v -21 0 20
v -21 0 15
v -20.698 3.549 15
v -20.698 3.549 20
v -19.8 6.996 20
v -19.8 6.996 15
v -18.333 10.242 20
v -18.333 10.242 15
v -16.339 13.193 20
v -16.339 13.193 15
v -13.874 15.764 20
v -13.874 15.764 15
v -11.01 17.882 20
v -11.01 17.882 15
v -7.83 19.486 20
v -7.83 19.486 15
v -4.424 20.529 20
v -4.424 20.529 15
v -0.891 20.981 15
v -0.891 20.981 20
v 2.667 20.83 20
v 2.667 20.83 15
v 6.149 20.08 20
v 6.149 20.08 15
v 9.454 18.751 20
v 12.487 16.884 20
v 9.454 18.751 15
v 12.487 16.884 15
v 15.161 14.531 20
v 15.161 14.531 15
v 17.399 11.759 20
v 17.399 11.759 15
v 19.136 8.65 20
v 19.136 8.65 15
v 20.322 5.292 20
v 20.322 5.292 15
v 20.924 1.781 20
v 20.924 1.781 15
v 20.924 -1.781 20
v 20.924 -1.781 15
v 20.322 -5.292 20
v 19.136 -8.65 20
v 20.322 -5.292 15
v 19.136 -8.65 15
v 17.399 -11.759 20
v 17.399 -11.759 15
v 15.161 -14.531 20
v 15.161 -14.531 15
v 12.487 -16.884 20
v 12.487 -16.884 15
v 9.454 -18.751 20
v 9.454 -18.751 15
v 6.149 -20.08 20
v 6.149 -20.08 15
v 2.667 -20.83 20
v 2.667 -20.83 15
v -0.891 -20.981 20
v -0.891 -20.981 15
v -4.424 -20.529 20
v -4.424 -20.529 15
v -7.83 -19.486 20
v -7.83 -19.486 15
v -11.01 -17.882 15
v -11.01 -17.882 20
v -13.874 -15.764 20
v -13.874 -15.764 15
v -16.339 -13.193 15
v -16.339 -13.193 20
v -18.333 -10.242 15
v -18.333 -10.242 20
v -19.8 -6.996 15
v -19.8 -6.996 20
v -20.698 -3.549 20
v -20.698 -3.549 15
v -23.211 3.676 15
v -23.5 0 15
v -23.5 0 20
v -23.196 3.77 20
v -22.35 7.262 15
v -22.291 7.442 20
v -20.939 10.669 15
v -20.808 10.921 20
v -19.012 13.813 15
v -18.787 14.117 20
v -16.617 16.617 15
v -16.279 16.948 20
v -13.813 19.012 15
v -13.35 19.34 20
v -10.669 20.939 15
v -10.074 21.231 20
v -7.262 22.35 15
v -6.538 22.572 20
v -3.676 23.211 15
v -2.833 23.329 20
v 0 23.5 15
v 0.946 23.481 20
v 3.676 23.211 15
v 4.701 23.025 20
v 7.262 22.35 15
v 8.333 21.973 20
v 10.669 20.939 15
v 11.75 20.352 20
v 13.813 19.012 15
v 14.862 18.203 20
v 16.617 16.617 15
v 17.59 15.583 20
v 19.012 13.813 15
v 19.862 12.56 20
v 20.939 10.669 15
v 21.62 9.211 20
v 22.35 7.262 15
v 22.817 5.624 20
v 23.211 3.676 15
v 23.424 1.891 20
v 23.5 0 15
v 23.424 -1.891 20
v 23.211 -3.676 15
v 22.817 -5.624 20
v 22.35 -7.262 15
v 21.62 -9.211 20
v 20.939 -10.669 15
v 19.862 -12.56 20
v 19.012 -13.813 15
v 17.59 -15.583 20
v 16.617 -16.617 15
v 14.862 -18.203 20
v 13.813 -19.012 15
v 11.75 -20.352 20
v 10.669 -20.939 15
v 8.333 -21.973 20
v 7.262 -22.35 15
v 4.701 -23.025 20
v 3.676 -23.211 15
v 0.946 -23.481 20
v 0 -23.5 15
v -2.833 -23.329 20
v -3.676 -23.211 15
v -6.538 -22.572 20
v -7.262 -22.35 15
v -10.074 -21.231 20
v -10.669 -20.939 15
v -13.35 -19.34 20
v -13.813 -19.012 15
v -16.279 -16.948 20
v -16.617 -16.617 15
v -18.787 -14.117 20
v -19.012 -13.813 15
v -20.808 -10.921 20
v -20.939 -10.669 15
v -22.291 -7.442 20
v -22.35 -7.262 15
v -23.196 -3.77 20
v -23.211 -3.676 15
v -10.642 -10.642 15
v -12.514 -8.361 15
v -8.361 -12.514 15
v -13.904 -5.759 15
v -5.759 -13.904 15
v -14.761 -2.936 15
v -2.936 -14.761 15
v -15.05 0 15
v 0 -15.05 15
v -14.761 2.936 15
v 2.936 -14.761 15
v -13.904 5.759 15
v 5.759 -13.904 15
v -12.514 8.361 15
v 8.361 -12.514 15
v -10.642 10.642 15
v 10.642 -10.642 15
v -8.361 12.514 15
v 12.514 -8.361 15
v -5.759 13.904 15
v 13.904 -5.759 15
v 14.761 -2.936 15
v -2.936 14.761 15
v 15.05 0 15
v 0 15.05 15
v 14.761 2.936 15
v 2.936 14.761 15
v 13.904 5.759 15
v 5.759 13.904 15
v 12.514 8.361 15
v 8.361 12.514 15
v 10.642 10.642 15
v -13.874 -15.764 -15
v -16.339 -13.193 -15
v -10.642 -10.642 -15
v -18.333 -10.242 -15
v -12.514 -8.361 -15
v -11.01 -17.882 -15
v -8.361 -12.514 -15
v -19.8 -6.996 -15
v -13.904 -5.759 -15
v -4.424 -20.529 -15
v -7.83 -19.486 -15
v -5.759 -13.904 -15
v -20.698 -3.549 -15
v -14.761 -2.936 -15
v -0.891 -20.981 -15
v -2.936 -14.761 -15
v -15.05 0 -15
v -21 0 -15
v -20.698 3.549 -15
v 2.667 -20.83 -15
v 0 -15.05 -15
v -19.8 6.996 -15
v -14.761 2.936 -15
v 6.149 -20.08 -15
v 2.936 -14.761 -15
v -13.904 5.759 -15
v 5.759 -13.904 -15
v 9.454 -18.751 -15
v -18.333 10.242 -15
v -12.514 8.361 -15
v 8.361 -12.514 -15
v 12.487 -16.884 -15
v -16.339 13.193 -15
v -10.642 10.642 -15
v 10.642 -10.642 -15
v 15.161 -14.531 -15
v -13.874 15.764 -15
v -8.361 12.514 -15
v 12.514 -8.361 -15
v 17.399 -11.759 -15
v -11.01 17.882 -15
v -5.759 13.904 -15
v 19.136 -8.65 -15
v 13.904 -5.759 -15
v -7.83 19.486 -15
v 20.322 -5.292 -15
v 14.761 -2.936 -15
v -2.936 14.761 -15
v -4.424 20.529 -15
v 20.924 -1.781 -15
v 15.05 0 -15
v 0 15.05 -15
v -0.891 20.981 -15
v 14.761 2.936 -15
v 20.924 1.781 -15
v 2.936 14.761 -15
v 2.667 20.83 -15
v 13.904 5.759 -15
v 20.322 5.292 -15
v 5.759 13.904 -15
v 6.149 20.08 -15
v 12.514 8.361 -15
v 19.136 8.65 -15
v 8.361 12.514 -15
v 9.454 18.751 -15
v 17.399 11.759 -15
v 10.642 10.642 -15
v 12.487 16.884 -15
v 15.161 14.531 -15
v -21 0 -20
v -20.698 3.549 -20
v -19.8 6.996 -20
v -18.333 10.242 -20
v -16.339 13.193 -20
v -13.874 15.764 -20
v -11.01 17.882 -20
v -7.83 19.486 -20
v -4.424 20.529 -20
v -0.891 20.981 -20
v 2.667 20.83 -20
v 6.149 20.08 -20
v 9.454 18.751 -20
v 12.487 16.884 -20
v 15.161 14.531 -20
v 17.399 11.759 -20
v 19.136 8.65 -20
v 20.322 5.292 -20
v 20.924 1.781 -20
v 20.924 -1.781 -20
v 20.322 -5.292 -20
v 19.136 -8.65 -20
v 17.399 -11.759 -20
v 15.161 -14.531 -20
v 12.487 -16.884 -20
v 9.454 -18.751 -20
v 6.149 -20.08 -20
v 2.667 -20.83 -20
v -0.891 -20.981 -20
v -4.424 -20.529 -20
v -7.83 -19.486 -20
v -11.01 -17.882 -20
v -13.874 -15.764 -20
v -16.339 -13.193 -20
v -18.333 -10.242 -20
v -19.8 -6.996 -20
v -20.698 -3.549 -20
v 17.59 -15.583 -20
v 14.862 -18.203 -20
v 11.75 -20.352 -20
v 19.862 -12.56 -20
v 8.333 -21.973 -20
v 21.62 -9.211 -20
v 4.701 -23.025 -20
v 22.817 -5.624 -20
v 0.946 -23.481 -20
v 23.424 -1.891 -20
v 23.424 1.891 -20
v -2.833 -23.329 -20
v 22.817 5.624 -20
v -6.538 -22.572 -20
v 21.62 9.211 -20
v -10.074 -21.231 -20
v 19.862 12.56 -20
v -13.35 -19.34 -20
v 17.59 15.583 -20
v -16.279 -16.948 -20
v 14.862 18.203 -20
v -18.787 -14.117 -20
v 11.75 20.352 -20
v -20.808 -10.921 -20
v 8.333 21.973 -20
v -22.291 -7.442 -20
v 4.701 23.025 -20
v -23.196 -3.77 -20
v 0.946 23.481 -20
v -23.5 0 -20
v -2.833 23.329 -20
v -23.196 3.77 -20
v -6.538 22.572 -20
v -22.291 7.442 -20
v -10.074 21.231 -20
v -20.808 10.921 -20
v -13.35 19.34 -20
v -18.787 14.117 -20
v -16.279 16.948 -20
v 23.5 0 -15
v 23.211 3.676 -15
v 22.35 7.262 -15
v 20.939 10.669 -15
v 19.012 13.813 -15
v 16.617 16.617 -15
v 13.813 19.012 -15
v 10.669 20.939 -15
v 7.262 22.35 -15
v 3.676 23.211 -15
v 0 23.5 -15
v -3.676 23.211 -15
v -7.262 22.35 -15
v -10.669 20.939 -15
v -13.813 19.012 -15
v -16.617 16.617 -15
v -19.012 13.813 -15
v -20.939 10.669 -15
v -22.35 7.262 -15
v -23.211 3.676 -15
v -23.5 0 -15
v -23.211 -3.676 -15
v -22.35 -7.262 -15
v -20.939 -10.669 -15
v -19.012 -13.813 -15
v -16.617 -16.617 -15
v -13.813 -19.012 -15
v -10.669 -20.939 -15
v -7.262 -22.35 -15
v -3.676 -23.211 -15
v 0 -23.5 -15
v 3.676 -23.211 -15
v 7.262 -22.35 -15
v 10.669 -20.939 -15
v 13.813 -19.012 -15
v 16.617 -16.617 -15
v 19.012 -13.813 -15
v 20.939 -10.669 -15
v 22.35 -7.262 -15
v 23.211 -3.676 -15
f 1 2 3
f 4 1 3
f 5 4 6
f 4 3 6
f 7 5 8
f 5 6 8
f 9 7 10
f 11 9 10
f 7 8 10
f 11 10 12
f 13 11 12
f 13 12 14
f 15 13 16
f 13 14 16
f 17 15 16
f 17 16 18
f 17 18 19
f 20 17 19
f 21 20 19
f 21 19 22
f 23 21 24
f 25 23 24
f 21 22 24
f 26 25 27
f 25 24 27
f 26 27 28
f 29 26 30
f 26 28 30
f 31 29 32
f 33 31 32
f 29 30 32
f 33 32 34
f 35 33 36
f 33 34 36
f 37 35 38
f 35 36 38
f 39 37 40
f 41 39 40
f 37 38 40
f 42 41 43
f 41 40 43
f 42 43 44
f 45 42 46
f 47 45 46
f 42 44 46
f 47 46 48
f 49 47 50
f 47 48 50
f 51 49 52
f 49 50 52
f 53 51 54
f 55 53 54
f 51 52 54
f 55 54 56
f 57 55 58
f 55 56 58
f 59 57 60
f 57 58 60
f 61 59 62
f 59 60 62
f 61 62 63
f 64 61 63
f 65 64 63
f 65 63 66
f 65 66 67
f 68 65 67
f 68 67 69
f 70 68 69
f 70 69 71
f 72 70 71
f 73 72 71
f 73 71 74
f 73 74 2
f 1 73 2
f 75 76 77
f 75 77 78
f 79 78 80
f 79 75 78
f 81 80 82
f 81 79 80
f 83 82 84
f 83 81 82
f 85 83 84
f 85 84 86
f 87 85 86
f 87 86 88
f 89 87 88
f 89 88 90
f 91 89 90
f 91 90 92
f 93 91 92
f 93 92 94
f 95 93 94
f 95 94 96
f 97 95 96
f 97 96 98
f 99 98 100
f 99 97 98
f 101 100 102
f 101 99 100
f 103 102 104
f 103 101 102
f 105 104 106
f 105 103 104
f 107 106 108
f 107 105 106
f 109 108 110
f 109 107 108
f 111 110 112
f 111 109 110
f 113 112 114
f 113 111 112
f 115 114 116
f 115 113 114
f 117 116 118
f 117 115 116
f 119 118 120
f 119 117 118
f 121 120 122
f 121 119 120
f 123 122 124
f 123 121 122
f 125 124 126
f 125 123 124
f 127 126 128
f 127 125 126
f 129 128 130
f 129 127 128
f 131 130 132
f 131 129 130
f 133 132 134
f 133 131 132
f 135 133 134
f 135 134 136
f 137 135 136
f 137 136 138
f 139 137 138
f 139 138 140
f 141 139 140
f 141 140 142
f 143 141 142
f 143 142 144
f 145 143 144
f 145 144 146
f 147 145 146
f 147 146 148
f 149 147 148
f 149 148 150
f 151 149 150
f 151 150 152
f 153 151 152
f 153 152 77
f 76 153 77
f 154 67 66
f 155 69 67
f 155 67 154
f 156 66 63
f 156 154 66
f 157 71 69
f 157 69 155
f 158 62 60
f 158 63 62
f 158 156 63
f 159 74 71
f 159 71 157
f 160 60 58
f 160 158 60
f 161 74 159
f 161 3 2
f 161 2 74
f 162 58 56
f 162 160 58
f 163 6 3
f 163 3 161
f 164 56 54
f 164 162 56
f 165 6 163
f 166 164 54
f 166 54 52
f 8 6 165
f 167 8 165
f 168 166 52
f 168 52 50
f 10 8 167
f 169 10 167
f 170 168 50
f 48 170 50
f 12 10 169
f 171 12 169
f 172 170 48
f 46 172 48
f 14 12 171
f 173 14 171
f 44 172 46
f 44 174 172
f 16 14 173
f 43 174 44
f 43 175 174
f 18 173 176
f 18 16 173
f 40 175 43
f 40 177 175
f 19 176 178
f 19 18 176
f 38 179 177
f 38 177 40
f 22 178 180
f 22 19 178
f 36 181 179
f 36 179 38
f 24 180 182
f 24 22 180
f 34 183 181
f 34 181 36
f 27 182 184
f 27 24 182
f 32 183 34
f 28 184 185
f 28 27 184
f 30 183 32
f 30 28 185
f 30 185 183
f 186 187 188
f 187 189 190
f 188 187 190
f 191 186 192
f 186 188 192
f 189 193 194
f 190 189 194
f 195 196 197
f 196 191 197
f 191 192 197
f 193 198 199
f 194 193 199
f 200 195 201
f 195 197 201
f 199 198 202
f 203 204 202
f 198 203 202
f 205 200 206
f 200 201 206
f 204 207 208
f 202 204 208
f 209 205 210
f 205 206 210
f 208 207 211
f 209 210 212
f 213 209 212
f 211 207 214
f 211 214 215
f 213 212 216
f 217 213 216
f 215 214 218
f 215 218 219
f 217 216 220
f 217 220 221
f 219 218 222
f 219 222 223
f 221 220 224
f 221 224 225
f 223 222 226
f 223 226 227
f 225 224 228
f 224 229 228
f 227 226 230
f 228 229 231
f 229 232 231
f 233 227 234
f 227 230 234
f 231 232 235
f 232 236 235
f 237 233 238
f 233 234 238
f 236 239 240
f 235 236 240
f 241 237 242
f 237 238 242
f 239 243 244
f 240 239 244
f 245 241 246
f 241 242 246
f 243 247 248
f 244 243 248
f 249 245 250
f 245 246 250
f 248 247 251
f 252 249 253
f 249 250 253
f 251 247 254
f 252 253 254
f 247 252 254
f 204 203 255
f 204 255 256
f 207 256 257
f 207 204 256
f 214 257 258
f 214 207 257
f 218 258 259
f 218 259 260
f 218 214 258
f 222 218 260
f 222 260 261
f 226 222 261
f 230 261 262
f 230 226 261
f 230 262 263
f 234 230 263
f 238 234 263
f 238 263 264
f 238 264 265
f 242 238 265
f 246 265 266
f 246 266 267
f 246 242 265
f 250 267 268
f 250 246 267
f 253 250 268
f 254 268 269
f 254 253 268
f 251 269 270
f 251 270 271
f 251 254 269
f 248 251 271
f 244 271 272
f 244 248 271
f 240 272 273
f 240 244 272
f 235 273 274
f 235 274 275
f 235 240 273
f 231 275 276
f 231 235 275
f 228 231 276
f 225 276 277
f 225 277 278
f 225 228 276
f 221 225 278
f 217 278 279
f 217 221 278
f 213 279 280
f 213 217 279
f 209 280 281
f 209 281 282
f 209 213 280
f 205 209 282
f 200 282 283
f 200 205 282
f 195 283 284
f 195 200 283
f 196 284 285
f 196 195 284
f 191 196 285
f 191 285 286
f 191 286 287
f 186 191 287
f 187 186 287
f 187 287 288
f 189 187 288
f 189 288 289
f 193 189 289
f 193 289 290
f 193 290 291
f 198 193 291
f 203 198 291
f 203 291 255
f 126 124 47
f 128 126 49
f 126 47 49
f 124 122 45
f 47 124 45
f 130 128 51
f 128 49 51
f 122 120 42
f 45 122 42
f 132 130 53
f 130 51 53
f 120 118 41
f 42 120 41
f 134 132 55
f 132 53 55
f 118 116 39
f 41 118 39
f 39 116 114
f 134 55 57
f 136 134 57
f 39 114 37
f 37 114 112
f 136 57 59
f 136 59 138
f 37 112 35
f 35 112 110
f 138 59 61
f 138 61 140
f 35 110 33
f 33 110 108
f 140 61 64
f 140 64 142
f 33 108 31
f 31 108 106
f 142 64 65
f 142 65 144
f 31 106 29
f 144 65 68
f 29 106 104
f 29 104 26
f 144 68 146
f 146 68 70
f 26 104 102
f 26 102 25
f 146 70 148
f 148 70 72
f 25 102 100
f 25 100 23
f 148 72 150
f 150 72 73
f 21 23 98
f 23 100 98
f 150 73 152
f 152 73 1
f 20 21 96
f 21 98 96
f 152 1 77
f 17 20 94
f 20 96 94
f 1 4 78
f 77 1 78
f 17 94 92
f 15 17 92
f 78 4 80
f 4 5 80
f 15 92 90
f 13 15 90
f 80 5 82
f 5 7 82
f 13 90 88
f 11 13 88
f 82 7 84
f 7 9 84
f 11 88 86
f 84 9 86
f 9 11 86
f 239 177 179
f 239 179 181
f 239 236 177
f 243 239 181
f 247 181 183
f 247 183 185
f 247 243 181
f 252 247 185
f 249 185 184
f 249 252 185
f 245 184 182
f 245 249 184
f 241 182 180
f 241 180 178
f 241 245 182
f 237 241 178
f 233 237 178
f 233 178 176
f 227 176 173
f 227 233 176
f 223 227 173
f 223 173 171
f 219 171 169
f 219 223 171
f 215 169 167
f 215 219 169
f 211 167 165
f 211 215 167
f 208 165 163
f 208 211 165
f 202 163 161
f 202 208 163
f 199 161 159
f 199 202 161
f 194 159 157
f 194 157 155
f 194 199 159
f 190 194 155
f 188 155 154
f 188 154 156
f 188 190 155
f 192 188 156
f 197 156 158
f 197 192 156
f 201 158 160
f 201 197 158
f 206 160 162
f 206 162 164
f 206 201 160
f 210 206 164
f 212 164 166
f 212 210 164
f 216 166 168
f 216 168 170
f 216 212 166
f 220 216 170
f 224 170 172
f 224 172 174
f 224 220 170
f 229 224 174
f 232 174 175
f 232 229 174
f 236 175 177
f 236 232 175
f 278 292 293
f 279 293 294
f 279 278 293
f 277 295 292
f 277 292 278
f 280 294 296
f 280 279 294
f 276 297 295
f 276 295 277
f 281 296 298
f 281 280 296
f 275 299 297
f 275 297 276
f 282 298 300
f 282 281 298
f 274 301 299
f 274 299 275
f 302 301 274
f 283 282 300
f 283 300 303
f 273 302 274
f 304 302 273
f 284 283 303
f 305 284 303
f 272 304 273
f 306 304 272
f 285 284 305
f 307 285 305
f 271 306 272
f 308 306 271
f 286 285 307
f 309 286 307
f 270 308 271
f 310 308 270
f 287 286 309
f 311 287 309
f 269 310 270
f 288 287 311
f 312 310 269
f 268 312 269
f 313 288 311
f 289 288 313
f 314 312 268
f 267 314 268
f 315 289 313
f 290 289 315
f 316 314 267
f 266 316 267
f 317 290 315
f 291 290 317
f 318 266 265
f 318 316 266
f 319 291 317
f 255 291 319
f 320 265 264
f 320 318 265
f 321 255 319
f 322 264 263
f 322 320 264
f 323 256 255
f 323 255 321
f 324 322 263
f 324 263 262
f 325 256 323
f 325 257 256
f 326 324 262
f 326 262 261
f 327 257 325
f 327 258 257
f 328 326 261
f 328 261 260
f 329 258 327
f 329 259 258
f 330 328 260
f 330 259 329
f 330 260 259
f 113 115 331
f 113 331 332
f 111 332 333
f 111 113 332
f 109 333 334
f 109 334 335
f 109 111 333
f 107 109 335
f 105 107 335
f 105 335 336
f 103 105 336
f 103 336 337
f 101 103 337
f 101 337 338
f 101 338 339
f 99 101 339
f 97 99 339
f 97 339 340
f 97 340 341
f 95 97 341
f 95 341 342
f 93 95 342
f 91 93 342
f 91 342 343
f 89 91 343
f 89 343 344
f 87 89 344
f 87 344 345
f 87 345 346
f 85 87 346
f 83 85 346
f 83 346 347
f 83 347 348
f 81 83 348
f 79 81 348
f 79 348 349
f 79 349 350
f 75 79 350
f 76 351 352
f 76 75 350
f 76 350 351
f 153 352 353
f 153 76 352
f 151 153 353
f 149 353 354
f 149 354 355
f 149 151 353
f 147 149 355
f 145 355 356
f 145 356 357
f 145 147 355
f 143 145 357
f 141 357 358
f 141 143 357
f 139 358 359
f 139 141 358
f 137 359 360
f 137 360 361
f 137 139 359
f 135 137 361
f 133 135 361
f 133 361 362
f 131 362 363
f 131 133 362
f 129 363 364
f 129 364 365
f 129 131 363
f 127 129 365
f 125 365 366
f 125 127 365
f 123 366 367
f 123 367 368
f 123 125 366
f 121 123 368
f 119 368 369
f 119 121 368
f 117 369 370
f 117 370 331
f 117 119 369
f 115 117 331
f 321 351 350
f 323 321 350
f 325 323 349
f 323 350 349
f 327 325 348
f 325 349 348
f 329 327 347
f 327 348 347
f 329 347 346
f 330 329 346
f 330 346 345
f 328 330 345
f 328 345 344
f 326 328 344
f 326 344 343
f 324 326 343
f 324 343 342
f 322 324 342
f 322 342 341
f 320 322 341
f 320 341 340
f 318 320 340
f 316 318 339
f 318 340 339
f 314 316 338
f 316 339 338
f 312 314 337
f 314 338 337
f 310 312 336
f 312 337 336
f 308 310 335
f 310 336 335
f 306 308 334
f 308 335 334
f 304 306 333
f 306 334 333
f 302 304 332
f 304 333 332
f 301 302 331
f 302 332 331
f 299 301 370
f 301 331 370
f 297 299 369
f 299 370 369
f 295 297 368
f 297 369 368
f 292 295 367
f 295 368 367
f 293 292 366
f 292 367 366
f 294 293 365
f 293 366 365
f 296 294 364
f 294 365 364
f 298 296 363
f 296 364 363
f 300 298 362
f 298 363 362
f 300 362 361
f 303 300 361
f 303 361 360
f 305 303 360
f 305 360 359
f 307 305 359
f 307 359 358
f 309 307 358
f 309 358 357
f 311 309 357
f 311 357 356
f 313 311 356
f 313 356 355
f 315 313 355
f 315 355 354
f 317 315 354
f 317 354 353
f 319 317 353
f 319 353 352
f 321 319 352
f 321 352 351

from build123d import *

# Parameters (mm, degrees)
SKETCH1_R           = 23.5
SKETCH1_R_2         = 15.05
BOSS_EXTRUDE1_DEPTH = 15
SKETCH2_R           = 23.5
SKETCH2_R_2         = 21
BOSS_EXTRUDE2_DEPTH = 5


with BuildPart() as part:
    # Sketch1 → Boss-Extrude1 (new body, symmetric)
    with BuildSketch(Plane.XY):
        Circle(SKETCH1_R)
        Circle(SKETCH1_R_2, mode=Mode.SUBTRACT)
    extrude(amount=BOSS_EXTRUDE1_DEPTH, both=True)

    # Sketch2 → Boss-Extrude2 (add)
    with BuildSketch(Plane(origin=(0, 0, -15), x_dir=(-1, 0, 0), z_dir=(0, 0, -1))):
        Circle(SKETCH2_R)
        Circle(SKETCH2_R_2, mode=Mode.SUBTRACT)
    boss_extrude2 = extrude(amount=BOSS_EXTRUDE2_DEPTH)

    # Mirror1: Boss-Extrude2 across plane
    add(boss_extrude2.mirror(Plane.XY))


solid = part.part
